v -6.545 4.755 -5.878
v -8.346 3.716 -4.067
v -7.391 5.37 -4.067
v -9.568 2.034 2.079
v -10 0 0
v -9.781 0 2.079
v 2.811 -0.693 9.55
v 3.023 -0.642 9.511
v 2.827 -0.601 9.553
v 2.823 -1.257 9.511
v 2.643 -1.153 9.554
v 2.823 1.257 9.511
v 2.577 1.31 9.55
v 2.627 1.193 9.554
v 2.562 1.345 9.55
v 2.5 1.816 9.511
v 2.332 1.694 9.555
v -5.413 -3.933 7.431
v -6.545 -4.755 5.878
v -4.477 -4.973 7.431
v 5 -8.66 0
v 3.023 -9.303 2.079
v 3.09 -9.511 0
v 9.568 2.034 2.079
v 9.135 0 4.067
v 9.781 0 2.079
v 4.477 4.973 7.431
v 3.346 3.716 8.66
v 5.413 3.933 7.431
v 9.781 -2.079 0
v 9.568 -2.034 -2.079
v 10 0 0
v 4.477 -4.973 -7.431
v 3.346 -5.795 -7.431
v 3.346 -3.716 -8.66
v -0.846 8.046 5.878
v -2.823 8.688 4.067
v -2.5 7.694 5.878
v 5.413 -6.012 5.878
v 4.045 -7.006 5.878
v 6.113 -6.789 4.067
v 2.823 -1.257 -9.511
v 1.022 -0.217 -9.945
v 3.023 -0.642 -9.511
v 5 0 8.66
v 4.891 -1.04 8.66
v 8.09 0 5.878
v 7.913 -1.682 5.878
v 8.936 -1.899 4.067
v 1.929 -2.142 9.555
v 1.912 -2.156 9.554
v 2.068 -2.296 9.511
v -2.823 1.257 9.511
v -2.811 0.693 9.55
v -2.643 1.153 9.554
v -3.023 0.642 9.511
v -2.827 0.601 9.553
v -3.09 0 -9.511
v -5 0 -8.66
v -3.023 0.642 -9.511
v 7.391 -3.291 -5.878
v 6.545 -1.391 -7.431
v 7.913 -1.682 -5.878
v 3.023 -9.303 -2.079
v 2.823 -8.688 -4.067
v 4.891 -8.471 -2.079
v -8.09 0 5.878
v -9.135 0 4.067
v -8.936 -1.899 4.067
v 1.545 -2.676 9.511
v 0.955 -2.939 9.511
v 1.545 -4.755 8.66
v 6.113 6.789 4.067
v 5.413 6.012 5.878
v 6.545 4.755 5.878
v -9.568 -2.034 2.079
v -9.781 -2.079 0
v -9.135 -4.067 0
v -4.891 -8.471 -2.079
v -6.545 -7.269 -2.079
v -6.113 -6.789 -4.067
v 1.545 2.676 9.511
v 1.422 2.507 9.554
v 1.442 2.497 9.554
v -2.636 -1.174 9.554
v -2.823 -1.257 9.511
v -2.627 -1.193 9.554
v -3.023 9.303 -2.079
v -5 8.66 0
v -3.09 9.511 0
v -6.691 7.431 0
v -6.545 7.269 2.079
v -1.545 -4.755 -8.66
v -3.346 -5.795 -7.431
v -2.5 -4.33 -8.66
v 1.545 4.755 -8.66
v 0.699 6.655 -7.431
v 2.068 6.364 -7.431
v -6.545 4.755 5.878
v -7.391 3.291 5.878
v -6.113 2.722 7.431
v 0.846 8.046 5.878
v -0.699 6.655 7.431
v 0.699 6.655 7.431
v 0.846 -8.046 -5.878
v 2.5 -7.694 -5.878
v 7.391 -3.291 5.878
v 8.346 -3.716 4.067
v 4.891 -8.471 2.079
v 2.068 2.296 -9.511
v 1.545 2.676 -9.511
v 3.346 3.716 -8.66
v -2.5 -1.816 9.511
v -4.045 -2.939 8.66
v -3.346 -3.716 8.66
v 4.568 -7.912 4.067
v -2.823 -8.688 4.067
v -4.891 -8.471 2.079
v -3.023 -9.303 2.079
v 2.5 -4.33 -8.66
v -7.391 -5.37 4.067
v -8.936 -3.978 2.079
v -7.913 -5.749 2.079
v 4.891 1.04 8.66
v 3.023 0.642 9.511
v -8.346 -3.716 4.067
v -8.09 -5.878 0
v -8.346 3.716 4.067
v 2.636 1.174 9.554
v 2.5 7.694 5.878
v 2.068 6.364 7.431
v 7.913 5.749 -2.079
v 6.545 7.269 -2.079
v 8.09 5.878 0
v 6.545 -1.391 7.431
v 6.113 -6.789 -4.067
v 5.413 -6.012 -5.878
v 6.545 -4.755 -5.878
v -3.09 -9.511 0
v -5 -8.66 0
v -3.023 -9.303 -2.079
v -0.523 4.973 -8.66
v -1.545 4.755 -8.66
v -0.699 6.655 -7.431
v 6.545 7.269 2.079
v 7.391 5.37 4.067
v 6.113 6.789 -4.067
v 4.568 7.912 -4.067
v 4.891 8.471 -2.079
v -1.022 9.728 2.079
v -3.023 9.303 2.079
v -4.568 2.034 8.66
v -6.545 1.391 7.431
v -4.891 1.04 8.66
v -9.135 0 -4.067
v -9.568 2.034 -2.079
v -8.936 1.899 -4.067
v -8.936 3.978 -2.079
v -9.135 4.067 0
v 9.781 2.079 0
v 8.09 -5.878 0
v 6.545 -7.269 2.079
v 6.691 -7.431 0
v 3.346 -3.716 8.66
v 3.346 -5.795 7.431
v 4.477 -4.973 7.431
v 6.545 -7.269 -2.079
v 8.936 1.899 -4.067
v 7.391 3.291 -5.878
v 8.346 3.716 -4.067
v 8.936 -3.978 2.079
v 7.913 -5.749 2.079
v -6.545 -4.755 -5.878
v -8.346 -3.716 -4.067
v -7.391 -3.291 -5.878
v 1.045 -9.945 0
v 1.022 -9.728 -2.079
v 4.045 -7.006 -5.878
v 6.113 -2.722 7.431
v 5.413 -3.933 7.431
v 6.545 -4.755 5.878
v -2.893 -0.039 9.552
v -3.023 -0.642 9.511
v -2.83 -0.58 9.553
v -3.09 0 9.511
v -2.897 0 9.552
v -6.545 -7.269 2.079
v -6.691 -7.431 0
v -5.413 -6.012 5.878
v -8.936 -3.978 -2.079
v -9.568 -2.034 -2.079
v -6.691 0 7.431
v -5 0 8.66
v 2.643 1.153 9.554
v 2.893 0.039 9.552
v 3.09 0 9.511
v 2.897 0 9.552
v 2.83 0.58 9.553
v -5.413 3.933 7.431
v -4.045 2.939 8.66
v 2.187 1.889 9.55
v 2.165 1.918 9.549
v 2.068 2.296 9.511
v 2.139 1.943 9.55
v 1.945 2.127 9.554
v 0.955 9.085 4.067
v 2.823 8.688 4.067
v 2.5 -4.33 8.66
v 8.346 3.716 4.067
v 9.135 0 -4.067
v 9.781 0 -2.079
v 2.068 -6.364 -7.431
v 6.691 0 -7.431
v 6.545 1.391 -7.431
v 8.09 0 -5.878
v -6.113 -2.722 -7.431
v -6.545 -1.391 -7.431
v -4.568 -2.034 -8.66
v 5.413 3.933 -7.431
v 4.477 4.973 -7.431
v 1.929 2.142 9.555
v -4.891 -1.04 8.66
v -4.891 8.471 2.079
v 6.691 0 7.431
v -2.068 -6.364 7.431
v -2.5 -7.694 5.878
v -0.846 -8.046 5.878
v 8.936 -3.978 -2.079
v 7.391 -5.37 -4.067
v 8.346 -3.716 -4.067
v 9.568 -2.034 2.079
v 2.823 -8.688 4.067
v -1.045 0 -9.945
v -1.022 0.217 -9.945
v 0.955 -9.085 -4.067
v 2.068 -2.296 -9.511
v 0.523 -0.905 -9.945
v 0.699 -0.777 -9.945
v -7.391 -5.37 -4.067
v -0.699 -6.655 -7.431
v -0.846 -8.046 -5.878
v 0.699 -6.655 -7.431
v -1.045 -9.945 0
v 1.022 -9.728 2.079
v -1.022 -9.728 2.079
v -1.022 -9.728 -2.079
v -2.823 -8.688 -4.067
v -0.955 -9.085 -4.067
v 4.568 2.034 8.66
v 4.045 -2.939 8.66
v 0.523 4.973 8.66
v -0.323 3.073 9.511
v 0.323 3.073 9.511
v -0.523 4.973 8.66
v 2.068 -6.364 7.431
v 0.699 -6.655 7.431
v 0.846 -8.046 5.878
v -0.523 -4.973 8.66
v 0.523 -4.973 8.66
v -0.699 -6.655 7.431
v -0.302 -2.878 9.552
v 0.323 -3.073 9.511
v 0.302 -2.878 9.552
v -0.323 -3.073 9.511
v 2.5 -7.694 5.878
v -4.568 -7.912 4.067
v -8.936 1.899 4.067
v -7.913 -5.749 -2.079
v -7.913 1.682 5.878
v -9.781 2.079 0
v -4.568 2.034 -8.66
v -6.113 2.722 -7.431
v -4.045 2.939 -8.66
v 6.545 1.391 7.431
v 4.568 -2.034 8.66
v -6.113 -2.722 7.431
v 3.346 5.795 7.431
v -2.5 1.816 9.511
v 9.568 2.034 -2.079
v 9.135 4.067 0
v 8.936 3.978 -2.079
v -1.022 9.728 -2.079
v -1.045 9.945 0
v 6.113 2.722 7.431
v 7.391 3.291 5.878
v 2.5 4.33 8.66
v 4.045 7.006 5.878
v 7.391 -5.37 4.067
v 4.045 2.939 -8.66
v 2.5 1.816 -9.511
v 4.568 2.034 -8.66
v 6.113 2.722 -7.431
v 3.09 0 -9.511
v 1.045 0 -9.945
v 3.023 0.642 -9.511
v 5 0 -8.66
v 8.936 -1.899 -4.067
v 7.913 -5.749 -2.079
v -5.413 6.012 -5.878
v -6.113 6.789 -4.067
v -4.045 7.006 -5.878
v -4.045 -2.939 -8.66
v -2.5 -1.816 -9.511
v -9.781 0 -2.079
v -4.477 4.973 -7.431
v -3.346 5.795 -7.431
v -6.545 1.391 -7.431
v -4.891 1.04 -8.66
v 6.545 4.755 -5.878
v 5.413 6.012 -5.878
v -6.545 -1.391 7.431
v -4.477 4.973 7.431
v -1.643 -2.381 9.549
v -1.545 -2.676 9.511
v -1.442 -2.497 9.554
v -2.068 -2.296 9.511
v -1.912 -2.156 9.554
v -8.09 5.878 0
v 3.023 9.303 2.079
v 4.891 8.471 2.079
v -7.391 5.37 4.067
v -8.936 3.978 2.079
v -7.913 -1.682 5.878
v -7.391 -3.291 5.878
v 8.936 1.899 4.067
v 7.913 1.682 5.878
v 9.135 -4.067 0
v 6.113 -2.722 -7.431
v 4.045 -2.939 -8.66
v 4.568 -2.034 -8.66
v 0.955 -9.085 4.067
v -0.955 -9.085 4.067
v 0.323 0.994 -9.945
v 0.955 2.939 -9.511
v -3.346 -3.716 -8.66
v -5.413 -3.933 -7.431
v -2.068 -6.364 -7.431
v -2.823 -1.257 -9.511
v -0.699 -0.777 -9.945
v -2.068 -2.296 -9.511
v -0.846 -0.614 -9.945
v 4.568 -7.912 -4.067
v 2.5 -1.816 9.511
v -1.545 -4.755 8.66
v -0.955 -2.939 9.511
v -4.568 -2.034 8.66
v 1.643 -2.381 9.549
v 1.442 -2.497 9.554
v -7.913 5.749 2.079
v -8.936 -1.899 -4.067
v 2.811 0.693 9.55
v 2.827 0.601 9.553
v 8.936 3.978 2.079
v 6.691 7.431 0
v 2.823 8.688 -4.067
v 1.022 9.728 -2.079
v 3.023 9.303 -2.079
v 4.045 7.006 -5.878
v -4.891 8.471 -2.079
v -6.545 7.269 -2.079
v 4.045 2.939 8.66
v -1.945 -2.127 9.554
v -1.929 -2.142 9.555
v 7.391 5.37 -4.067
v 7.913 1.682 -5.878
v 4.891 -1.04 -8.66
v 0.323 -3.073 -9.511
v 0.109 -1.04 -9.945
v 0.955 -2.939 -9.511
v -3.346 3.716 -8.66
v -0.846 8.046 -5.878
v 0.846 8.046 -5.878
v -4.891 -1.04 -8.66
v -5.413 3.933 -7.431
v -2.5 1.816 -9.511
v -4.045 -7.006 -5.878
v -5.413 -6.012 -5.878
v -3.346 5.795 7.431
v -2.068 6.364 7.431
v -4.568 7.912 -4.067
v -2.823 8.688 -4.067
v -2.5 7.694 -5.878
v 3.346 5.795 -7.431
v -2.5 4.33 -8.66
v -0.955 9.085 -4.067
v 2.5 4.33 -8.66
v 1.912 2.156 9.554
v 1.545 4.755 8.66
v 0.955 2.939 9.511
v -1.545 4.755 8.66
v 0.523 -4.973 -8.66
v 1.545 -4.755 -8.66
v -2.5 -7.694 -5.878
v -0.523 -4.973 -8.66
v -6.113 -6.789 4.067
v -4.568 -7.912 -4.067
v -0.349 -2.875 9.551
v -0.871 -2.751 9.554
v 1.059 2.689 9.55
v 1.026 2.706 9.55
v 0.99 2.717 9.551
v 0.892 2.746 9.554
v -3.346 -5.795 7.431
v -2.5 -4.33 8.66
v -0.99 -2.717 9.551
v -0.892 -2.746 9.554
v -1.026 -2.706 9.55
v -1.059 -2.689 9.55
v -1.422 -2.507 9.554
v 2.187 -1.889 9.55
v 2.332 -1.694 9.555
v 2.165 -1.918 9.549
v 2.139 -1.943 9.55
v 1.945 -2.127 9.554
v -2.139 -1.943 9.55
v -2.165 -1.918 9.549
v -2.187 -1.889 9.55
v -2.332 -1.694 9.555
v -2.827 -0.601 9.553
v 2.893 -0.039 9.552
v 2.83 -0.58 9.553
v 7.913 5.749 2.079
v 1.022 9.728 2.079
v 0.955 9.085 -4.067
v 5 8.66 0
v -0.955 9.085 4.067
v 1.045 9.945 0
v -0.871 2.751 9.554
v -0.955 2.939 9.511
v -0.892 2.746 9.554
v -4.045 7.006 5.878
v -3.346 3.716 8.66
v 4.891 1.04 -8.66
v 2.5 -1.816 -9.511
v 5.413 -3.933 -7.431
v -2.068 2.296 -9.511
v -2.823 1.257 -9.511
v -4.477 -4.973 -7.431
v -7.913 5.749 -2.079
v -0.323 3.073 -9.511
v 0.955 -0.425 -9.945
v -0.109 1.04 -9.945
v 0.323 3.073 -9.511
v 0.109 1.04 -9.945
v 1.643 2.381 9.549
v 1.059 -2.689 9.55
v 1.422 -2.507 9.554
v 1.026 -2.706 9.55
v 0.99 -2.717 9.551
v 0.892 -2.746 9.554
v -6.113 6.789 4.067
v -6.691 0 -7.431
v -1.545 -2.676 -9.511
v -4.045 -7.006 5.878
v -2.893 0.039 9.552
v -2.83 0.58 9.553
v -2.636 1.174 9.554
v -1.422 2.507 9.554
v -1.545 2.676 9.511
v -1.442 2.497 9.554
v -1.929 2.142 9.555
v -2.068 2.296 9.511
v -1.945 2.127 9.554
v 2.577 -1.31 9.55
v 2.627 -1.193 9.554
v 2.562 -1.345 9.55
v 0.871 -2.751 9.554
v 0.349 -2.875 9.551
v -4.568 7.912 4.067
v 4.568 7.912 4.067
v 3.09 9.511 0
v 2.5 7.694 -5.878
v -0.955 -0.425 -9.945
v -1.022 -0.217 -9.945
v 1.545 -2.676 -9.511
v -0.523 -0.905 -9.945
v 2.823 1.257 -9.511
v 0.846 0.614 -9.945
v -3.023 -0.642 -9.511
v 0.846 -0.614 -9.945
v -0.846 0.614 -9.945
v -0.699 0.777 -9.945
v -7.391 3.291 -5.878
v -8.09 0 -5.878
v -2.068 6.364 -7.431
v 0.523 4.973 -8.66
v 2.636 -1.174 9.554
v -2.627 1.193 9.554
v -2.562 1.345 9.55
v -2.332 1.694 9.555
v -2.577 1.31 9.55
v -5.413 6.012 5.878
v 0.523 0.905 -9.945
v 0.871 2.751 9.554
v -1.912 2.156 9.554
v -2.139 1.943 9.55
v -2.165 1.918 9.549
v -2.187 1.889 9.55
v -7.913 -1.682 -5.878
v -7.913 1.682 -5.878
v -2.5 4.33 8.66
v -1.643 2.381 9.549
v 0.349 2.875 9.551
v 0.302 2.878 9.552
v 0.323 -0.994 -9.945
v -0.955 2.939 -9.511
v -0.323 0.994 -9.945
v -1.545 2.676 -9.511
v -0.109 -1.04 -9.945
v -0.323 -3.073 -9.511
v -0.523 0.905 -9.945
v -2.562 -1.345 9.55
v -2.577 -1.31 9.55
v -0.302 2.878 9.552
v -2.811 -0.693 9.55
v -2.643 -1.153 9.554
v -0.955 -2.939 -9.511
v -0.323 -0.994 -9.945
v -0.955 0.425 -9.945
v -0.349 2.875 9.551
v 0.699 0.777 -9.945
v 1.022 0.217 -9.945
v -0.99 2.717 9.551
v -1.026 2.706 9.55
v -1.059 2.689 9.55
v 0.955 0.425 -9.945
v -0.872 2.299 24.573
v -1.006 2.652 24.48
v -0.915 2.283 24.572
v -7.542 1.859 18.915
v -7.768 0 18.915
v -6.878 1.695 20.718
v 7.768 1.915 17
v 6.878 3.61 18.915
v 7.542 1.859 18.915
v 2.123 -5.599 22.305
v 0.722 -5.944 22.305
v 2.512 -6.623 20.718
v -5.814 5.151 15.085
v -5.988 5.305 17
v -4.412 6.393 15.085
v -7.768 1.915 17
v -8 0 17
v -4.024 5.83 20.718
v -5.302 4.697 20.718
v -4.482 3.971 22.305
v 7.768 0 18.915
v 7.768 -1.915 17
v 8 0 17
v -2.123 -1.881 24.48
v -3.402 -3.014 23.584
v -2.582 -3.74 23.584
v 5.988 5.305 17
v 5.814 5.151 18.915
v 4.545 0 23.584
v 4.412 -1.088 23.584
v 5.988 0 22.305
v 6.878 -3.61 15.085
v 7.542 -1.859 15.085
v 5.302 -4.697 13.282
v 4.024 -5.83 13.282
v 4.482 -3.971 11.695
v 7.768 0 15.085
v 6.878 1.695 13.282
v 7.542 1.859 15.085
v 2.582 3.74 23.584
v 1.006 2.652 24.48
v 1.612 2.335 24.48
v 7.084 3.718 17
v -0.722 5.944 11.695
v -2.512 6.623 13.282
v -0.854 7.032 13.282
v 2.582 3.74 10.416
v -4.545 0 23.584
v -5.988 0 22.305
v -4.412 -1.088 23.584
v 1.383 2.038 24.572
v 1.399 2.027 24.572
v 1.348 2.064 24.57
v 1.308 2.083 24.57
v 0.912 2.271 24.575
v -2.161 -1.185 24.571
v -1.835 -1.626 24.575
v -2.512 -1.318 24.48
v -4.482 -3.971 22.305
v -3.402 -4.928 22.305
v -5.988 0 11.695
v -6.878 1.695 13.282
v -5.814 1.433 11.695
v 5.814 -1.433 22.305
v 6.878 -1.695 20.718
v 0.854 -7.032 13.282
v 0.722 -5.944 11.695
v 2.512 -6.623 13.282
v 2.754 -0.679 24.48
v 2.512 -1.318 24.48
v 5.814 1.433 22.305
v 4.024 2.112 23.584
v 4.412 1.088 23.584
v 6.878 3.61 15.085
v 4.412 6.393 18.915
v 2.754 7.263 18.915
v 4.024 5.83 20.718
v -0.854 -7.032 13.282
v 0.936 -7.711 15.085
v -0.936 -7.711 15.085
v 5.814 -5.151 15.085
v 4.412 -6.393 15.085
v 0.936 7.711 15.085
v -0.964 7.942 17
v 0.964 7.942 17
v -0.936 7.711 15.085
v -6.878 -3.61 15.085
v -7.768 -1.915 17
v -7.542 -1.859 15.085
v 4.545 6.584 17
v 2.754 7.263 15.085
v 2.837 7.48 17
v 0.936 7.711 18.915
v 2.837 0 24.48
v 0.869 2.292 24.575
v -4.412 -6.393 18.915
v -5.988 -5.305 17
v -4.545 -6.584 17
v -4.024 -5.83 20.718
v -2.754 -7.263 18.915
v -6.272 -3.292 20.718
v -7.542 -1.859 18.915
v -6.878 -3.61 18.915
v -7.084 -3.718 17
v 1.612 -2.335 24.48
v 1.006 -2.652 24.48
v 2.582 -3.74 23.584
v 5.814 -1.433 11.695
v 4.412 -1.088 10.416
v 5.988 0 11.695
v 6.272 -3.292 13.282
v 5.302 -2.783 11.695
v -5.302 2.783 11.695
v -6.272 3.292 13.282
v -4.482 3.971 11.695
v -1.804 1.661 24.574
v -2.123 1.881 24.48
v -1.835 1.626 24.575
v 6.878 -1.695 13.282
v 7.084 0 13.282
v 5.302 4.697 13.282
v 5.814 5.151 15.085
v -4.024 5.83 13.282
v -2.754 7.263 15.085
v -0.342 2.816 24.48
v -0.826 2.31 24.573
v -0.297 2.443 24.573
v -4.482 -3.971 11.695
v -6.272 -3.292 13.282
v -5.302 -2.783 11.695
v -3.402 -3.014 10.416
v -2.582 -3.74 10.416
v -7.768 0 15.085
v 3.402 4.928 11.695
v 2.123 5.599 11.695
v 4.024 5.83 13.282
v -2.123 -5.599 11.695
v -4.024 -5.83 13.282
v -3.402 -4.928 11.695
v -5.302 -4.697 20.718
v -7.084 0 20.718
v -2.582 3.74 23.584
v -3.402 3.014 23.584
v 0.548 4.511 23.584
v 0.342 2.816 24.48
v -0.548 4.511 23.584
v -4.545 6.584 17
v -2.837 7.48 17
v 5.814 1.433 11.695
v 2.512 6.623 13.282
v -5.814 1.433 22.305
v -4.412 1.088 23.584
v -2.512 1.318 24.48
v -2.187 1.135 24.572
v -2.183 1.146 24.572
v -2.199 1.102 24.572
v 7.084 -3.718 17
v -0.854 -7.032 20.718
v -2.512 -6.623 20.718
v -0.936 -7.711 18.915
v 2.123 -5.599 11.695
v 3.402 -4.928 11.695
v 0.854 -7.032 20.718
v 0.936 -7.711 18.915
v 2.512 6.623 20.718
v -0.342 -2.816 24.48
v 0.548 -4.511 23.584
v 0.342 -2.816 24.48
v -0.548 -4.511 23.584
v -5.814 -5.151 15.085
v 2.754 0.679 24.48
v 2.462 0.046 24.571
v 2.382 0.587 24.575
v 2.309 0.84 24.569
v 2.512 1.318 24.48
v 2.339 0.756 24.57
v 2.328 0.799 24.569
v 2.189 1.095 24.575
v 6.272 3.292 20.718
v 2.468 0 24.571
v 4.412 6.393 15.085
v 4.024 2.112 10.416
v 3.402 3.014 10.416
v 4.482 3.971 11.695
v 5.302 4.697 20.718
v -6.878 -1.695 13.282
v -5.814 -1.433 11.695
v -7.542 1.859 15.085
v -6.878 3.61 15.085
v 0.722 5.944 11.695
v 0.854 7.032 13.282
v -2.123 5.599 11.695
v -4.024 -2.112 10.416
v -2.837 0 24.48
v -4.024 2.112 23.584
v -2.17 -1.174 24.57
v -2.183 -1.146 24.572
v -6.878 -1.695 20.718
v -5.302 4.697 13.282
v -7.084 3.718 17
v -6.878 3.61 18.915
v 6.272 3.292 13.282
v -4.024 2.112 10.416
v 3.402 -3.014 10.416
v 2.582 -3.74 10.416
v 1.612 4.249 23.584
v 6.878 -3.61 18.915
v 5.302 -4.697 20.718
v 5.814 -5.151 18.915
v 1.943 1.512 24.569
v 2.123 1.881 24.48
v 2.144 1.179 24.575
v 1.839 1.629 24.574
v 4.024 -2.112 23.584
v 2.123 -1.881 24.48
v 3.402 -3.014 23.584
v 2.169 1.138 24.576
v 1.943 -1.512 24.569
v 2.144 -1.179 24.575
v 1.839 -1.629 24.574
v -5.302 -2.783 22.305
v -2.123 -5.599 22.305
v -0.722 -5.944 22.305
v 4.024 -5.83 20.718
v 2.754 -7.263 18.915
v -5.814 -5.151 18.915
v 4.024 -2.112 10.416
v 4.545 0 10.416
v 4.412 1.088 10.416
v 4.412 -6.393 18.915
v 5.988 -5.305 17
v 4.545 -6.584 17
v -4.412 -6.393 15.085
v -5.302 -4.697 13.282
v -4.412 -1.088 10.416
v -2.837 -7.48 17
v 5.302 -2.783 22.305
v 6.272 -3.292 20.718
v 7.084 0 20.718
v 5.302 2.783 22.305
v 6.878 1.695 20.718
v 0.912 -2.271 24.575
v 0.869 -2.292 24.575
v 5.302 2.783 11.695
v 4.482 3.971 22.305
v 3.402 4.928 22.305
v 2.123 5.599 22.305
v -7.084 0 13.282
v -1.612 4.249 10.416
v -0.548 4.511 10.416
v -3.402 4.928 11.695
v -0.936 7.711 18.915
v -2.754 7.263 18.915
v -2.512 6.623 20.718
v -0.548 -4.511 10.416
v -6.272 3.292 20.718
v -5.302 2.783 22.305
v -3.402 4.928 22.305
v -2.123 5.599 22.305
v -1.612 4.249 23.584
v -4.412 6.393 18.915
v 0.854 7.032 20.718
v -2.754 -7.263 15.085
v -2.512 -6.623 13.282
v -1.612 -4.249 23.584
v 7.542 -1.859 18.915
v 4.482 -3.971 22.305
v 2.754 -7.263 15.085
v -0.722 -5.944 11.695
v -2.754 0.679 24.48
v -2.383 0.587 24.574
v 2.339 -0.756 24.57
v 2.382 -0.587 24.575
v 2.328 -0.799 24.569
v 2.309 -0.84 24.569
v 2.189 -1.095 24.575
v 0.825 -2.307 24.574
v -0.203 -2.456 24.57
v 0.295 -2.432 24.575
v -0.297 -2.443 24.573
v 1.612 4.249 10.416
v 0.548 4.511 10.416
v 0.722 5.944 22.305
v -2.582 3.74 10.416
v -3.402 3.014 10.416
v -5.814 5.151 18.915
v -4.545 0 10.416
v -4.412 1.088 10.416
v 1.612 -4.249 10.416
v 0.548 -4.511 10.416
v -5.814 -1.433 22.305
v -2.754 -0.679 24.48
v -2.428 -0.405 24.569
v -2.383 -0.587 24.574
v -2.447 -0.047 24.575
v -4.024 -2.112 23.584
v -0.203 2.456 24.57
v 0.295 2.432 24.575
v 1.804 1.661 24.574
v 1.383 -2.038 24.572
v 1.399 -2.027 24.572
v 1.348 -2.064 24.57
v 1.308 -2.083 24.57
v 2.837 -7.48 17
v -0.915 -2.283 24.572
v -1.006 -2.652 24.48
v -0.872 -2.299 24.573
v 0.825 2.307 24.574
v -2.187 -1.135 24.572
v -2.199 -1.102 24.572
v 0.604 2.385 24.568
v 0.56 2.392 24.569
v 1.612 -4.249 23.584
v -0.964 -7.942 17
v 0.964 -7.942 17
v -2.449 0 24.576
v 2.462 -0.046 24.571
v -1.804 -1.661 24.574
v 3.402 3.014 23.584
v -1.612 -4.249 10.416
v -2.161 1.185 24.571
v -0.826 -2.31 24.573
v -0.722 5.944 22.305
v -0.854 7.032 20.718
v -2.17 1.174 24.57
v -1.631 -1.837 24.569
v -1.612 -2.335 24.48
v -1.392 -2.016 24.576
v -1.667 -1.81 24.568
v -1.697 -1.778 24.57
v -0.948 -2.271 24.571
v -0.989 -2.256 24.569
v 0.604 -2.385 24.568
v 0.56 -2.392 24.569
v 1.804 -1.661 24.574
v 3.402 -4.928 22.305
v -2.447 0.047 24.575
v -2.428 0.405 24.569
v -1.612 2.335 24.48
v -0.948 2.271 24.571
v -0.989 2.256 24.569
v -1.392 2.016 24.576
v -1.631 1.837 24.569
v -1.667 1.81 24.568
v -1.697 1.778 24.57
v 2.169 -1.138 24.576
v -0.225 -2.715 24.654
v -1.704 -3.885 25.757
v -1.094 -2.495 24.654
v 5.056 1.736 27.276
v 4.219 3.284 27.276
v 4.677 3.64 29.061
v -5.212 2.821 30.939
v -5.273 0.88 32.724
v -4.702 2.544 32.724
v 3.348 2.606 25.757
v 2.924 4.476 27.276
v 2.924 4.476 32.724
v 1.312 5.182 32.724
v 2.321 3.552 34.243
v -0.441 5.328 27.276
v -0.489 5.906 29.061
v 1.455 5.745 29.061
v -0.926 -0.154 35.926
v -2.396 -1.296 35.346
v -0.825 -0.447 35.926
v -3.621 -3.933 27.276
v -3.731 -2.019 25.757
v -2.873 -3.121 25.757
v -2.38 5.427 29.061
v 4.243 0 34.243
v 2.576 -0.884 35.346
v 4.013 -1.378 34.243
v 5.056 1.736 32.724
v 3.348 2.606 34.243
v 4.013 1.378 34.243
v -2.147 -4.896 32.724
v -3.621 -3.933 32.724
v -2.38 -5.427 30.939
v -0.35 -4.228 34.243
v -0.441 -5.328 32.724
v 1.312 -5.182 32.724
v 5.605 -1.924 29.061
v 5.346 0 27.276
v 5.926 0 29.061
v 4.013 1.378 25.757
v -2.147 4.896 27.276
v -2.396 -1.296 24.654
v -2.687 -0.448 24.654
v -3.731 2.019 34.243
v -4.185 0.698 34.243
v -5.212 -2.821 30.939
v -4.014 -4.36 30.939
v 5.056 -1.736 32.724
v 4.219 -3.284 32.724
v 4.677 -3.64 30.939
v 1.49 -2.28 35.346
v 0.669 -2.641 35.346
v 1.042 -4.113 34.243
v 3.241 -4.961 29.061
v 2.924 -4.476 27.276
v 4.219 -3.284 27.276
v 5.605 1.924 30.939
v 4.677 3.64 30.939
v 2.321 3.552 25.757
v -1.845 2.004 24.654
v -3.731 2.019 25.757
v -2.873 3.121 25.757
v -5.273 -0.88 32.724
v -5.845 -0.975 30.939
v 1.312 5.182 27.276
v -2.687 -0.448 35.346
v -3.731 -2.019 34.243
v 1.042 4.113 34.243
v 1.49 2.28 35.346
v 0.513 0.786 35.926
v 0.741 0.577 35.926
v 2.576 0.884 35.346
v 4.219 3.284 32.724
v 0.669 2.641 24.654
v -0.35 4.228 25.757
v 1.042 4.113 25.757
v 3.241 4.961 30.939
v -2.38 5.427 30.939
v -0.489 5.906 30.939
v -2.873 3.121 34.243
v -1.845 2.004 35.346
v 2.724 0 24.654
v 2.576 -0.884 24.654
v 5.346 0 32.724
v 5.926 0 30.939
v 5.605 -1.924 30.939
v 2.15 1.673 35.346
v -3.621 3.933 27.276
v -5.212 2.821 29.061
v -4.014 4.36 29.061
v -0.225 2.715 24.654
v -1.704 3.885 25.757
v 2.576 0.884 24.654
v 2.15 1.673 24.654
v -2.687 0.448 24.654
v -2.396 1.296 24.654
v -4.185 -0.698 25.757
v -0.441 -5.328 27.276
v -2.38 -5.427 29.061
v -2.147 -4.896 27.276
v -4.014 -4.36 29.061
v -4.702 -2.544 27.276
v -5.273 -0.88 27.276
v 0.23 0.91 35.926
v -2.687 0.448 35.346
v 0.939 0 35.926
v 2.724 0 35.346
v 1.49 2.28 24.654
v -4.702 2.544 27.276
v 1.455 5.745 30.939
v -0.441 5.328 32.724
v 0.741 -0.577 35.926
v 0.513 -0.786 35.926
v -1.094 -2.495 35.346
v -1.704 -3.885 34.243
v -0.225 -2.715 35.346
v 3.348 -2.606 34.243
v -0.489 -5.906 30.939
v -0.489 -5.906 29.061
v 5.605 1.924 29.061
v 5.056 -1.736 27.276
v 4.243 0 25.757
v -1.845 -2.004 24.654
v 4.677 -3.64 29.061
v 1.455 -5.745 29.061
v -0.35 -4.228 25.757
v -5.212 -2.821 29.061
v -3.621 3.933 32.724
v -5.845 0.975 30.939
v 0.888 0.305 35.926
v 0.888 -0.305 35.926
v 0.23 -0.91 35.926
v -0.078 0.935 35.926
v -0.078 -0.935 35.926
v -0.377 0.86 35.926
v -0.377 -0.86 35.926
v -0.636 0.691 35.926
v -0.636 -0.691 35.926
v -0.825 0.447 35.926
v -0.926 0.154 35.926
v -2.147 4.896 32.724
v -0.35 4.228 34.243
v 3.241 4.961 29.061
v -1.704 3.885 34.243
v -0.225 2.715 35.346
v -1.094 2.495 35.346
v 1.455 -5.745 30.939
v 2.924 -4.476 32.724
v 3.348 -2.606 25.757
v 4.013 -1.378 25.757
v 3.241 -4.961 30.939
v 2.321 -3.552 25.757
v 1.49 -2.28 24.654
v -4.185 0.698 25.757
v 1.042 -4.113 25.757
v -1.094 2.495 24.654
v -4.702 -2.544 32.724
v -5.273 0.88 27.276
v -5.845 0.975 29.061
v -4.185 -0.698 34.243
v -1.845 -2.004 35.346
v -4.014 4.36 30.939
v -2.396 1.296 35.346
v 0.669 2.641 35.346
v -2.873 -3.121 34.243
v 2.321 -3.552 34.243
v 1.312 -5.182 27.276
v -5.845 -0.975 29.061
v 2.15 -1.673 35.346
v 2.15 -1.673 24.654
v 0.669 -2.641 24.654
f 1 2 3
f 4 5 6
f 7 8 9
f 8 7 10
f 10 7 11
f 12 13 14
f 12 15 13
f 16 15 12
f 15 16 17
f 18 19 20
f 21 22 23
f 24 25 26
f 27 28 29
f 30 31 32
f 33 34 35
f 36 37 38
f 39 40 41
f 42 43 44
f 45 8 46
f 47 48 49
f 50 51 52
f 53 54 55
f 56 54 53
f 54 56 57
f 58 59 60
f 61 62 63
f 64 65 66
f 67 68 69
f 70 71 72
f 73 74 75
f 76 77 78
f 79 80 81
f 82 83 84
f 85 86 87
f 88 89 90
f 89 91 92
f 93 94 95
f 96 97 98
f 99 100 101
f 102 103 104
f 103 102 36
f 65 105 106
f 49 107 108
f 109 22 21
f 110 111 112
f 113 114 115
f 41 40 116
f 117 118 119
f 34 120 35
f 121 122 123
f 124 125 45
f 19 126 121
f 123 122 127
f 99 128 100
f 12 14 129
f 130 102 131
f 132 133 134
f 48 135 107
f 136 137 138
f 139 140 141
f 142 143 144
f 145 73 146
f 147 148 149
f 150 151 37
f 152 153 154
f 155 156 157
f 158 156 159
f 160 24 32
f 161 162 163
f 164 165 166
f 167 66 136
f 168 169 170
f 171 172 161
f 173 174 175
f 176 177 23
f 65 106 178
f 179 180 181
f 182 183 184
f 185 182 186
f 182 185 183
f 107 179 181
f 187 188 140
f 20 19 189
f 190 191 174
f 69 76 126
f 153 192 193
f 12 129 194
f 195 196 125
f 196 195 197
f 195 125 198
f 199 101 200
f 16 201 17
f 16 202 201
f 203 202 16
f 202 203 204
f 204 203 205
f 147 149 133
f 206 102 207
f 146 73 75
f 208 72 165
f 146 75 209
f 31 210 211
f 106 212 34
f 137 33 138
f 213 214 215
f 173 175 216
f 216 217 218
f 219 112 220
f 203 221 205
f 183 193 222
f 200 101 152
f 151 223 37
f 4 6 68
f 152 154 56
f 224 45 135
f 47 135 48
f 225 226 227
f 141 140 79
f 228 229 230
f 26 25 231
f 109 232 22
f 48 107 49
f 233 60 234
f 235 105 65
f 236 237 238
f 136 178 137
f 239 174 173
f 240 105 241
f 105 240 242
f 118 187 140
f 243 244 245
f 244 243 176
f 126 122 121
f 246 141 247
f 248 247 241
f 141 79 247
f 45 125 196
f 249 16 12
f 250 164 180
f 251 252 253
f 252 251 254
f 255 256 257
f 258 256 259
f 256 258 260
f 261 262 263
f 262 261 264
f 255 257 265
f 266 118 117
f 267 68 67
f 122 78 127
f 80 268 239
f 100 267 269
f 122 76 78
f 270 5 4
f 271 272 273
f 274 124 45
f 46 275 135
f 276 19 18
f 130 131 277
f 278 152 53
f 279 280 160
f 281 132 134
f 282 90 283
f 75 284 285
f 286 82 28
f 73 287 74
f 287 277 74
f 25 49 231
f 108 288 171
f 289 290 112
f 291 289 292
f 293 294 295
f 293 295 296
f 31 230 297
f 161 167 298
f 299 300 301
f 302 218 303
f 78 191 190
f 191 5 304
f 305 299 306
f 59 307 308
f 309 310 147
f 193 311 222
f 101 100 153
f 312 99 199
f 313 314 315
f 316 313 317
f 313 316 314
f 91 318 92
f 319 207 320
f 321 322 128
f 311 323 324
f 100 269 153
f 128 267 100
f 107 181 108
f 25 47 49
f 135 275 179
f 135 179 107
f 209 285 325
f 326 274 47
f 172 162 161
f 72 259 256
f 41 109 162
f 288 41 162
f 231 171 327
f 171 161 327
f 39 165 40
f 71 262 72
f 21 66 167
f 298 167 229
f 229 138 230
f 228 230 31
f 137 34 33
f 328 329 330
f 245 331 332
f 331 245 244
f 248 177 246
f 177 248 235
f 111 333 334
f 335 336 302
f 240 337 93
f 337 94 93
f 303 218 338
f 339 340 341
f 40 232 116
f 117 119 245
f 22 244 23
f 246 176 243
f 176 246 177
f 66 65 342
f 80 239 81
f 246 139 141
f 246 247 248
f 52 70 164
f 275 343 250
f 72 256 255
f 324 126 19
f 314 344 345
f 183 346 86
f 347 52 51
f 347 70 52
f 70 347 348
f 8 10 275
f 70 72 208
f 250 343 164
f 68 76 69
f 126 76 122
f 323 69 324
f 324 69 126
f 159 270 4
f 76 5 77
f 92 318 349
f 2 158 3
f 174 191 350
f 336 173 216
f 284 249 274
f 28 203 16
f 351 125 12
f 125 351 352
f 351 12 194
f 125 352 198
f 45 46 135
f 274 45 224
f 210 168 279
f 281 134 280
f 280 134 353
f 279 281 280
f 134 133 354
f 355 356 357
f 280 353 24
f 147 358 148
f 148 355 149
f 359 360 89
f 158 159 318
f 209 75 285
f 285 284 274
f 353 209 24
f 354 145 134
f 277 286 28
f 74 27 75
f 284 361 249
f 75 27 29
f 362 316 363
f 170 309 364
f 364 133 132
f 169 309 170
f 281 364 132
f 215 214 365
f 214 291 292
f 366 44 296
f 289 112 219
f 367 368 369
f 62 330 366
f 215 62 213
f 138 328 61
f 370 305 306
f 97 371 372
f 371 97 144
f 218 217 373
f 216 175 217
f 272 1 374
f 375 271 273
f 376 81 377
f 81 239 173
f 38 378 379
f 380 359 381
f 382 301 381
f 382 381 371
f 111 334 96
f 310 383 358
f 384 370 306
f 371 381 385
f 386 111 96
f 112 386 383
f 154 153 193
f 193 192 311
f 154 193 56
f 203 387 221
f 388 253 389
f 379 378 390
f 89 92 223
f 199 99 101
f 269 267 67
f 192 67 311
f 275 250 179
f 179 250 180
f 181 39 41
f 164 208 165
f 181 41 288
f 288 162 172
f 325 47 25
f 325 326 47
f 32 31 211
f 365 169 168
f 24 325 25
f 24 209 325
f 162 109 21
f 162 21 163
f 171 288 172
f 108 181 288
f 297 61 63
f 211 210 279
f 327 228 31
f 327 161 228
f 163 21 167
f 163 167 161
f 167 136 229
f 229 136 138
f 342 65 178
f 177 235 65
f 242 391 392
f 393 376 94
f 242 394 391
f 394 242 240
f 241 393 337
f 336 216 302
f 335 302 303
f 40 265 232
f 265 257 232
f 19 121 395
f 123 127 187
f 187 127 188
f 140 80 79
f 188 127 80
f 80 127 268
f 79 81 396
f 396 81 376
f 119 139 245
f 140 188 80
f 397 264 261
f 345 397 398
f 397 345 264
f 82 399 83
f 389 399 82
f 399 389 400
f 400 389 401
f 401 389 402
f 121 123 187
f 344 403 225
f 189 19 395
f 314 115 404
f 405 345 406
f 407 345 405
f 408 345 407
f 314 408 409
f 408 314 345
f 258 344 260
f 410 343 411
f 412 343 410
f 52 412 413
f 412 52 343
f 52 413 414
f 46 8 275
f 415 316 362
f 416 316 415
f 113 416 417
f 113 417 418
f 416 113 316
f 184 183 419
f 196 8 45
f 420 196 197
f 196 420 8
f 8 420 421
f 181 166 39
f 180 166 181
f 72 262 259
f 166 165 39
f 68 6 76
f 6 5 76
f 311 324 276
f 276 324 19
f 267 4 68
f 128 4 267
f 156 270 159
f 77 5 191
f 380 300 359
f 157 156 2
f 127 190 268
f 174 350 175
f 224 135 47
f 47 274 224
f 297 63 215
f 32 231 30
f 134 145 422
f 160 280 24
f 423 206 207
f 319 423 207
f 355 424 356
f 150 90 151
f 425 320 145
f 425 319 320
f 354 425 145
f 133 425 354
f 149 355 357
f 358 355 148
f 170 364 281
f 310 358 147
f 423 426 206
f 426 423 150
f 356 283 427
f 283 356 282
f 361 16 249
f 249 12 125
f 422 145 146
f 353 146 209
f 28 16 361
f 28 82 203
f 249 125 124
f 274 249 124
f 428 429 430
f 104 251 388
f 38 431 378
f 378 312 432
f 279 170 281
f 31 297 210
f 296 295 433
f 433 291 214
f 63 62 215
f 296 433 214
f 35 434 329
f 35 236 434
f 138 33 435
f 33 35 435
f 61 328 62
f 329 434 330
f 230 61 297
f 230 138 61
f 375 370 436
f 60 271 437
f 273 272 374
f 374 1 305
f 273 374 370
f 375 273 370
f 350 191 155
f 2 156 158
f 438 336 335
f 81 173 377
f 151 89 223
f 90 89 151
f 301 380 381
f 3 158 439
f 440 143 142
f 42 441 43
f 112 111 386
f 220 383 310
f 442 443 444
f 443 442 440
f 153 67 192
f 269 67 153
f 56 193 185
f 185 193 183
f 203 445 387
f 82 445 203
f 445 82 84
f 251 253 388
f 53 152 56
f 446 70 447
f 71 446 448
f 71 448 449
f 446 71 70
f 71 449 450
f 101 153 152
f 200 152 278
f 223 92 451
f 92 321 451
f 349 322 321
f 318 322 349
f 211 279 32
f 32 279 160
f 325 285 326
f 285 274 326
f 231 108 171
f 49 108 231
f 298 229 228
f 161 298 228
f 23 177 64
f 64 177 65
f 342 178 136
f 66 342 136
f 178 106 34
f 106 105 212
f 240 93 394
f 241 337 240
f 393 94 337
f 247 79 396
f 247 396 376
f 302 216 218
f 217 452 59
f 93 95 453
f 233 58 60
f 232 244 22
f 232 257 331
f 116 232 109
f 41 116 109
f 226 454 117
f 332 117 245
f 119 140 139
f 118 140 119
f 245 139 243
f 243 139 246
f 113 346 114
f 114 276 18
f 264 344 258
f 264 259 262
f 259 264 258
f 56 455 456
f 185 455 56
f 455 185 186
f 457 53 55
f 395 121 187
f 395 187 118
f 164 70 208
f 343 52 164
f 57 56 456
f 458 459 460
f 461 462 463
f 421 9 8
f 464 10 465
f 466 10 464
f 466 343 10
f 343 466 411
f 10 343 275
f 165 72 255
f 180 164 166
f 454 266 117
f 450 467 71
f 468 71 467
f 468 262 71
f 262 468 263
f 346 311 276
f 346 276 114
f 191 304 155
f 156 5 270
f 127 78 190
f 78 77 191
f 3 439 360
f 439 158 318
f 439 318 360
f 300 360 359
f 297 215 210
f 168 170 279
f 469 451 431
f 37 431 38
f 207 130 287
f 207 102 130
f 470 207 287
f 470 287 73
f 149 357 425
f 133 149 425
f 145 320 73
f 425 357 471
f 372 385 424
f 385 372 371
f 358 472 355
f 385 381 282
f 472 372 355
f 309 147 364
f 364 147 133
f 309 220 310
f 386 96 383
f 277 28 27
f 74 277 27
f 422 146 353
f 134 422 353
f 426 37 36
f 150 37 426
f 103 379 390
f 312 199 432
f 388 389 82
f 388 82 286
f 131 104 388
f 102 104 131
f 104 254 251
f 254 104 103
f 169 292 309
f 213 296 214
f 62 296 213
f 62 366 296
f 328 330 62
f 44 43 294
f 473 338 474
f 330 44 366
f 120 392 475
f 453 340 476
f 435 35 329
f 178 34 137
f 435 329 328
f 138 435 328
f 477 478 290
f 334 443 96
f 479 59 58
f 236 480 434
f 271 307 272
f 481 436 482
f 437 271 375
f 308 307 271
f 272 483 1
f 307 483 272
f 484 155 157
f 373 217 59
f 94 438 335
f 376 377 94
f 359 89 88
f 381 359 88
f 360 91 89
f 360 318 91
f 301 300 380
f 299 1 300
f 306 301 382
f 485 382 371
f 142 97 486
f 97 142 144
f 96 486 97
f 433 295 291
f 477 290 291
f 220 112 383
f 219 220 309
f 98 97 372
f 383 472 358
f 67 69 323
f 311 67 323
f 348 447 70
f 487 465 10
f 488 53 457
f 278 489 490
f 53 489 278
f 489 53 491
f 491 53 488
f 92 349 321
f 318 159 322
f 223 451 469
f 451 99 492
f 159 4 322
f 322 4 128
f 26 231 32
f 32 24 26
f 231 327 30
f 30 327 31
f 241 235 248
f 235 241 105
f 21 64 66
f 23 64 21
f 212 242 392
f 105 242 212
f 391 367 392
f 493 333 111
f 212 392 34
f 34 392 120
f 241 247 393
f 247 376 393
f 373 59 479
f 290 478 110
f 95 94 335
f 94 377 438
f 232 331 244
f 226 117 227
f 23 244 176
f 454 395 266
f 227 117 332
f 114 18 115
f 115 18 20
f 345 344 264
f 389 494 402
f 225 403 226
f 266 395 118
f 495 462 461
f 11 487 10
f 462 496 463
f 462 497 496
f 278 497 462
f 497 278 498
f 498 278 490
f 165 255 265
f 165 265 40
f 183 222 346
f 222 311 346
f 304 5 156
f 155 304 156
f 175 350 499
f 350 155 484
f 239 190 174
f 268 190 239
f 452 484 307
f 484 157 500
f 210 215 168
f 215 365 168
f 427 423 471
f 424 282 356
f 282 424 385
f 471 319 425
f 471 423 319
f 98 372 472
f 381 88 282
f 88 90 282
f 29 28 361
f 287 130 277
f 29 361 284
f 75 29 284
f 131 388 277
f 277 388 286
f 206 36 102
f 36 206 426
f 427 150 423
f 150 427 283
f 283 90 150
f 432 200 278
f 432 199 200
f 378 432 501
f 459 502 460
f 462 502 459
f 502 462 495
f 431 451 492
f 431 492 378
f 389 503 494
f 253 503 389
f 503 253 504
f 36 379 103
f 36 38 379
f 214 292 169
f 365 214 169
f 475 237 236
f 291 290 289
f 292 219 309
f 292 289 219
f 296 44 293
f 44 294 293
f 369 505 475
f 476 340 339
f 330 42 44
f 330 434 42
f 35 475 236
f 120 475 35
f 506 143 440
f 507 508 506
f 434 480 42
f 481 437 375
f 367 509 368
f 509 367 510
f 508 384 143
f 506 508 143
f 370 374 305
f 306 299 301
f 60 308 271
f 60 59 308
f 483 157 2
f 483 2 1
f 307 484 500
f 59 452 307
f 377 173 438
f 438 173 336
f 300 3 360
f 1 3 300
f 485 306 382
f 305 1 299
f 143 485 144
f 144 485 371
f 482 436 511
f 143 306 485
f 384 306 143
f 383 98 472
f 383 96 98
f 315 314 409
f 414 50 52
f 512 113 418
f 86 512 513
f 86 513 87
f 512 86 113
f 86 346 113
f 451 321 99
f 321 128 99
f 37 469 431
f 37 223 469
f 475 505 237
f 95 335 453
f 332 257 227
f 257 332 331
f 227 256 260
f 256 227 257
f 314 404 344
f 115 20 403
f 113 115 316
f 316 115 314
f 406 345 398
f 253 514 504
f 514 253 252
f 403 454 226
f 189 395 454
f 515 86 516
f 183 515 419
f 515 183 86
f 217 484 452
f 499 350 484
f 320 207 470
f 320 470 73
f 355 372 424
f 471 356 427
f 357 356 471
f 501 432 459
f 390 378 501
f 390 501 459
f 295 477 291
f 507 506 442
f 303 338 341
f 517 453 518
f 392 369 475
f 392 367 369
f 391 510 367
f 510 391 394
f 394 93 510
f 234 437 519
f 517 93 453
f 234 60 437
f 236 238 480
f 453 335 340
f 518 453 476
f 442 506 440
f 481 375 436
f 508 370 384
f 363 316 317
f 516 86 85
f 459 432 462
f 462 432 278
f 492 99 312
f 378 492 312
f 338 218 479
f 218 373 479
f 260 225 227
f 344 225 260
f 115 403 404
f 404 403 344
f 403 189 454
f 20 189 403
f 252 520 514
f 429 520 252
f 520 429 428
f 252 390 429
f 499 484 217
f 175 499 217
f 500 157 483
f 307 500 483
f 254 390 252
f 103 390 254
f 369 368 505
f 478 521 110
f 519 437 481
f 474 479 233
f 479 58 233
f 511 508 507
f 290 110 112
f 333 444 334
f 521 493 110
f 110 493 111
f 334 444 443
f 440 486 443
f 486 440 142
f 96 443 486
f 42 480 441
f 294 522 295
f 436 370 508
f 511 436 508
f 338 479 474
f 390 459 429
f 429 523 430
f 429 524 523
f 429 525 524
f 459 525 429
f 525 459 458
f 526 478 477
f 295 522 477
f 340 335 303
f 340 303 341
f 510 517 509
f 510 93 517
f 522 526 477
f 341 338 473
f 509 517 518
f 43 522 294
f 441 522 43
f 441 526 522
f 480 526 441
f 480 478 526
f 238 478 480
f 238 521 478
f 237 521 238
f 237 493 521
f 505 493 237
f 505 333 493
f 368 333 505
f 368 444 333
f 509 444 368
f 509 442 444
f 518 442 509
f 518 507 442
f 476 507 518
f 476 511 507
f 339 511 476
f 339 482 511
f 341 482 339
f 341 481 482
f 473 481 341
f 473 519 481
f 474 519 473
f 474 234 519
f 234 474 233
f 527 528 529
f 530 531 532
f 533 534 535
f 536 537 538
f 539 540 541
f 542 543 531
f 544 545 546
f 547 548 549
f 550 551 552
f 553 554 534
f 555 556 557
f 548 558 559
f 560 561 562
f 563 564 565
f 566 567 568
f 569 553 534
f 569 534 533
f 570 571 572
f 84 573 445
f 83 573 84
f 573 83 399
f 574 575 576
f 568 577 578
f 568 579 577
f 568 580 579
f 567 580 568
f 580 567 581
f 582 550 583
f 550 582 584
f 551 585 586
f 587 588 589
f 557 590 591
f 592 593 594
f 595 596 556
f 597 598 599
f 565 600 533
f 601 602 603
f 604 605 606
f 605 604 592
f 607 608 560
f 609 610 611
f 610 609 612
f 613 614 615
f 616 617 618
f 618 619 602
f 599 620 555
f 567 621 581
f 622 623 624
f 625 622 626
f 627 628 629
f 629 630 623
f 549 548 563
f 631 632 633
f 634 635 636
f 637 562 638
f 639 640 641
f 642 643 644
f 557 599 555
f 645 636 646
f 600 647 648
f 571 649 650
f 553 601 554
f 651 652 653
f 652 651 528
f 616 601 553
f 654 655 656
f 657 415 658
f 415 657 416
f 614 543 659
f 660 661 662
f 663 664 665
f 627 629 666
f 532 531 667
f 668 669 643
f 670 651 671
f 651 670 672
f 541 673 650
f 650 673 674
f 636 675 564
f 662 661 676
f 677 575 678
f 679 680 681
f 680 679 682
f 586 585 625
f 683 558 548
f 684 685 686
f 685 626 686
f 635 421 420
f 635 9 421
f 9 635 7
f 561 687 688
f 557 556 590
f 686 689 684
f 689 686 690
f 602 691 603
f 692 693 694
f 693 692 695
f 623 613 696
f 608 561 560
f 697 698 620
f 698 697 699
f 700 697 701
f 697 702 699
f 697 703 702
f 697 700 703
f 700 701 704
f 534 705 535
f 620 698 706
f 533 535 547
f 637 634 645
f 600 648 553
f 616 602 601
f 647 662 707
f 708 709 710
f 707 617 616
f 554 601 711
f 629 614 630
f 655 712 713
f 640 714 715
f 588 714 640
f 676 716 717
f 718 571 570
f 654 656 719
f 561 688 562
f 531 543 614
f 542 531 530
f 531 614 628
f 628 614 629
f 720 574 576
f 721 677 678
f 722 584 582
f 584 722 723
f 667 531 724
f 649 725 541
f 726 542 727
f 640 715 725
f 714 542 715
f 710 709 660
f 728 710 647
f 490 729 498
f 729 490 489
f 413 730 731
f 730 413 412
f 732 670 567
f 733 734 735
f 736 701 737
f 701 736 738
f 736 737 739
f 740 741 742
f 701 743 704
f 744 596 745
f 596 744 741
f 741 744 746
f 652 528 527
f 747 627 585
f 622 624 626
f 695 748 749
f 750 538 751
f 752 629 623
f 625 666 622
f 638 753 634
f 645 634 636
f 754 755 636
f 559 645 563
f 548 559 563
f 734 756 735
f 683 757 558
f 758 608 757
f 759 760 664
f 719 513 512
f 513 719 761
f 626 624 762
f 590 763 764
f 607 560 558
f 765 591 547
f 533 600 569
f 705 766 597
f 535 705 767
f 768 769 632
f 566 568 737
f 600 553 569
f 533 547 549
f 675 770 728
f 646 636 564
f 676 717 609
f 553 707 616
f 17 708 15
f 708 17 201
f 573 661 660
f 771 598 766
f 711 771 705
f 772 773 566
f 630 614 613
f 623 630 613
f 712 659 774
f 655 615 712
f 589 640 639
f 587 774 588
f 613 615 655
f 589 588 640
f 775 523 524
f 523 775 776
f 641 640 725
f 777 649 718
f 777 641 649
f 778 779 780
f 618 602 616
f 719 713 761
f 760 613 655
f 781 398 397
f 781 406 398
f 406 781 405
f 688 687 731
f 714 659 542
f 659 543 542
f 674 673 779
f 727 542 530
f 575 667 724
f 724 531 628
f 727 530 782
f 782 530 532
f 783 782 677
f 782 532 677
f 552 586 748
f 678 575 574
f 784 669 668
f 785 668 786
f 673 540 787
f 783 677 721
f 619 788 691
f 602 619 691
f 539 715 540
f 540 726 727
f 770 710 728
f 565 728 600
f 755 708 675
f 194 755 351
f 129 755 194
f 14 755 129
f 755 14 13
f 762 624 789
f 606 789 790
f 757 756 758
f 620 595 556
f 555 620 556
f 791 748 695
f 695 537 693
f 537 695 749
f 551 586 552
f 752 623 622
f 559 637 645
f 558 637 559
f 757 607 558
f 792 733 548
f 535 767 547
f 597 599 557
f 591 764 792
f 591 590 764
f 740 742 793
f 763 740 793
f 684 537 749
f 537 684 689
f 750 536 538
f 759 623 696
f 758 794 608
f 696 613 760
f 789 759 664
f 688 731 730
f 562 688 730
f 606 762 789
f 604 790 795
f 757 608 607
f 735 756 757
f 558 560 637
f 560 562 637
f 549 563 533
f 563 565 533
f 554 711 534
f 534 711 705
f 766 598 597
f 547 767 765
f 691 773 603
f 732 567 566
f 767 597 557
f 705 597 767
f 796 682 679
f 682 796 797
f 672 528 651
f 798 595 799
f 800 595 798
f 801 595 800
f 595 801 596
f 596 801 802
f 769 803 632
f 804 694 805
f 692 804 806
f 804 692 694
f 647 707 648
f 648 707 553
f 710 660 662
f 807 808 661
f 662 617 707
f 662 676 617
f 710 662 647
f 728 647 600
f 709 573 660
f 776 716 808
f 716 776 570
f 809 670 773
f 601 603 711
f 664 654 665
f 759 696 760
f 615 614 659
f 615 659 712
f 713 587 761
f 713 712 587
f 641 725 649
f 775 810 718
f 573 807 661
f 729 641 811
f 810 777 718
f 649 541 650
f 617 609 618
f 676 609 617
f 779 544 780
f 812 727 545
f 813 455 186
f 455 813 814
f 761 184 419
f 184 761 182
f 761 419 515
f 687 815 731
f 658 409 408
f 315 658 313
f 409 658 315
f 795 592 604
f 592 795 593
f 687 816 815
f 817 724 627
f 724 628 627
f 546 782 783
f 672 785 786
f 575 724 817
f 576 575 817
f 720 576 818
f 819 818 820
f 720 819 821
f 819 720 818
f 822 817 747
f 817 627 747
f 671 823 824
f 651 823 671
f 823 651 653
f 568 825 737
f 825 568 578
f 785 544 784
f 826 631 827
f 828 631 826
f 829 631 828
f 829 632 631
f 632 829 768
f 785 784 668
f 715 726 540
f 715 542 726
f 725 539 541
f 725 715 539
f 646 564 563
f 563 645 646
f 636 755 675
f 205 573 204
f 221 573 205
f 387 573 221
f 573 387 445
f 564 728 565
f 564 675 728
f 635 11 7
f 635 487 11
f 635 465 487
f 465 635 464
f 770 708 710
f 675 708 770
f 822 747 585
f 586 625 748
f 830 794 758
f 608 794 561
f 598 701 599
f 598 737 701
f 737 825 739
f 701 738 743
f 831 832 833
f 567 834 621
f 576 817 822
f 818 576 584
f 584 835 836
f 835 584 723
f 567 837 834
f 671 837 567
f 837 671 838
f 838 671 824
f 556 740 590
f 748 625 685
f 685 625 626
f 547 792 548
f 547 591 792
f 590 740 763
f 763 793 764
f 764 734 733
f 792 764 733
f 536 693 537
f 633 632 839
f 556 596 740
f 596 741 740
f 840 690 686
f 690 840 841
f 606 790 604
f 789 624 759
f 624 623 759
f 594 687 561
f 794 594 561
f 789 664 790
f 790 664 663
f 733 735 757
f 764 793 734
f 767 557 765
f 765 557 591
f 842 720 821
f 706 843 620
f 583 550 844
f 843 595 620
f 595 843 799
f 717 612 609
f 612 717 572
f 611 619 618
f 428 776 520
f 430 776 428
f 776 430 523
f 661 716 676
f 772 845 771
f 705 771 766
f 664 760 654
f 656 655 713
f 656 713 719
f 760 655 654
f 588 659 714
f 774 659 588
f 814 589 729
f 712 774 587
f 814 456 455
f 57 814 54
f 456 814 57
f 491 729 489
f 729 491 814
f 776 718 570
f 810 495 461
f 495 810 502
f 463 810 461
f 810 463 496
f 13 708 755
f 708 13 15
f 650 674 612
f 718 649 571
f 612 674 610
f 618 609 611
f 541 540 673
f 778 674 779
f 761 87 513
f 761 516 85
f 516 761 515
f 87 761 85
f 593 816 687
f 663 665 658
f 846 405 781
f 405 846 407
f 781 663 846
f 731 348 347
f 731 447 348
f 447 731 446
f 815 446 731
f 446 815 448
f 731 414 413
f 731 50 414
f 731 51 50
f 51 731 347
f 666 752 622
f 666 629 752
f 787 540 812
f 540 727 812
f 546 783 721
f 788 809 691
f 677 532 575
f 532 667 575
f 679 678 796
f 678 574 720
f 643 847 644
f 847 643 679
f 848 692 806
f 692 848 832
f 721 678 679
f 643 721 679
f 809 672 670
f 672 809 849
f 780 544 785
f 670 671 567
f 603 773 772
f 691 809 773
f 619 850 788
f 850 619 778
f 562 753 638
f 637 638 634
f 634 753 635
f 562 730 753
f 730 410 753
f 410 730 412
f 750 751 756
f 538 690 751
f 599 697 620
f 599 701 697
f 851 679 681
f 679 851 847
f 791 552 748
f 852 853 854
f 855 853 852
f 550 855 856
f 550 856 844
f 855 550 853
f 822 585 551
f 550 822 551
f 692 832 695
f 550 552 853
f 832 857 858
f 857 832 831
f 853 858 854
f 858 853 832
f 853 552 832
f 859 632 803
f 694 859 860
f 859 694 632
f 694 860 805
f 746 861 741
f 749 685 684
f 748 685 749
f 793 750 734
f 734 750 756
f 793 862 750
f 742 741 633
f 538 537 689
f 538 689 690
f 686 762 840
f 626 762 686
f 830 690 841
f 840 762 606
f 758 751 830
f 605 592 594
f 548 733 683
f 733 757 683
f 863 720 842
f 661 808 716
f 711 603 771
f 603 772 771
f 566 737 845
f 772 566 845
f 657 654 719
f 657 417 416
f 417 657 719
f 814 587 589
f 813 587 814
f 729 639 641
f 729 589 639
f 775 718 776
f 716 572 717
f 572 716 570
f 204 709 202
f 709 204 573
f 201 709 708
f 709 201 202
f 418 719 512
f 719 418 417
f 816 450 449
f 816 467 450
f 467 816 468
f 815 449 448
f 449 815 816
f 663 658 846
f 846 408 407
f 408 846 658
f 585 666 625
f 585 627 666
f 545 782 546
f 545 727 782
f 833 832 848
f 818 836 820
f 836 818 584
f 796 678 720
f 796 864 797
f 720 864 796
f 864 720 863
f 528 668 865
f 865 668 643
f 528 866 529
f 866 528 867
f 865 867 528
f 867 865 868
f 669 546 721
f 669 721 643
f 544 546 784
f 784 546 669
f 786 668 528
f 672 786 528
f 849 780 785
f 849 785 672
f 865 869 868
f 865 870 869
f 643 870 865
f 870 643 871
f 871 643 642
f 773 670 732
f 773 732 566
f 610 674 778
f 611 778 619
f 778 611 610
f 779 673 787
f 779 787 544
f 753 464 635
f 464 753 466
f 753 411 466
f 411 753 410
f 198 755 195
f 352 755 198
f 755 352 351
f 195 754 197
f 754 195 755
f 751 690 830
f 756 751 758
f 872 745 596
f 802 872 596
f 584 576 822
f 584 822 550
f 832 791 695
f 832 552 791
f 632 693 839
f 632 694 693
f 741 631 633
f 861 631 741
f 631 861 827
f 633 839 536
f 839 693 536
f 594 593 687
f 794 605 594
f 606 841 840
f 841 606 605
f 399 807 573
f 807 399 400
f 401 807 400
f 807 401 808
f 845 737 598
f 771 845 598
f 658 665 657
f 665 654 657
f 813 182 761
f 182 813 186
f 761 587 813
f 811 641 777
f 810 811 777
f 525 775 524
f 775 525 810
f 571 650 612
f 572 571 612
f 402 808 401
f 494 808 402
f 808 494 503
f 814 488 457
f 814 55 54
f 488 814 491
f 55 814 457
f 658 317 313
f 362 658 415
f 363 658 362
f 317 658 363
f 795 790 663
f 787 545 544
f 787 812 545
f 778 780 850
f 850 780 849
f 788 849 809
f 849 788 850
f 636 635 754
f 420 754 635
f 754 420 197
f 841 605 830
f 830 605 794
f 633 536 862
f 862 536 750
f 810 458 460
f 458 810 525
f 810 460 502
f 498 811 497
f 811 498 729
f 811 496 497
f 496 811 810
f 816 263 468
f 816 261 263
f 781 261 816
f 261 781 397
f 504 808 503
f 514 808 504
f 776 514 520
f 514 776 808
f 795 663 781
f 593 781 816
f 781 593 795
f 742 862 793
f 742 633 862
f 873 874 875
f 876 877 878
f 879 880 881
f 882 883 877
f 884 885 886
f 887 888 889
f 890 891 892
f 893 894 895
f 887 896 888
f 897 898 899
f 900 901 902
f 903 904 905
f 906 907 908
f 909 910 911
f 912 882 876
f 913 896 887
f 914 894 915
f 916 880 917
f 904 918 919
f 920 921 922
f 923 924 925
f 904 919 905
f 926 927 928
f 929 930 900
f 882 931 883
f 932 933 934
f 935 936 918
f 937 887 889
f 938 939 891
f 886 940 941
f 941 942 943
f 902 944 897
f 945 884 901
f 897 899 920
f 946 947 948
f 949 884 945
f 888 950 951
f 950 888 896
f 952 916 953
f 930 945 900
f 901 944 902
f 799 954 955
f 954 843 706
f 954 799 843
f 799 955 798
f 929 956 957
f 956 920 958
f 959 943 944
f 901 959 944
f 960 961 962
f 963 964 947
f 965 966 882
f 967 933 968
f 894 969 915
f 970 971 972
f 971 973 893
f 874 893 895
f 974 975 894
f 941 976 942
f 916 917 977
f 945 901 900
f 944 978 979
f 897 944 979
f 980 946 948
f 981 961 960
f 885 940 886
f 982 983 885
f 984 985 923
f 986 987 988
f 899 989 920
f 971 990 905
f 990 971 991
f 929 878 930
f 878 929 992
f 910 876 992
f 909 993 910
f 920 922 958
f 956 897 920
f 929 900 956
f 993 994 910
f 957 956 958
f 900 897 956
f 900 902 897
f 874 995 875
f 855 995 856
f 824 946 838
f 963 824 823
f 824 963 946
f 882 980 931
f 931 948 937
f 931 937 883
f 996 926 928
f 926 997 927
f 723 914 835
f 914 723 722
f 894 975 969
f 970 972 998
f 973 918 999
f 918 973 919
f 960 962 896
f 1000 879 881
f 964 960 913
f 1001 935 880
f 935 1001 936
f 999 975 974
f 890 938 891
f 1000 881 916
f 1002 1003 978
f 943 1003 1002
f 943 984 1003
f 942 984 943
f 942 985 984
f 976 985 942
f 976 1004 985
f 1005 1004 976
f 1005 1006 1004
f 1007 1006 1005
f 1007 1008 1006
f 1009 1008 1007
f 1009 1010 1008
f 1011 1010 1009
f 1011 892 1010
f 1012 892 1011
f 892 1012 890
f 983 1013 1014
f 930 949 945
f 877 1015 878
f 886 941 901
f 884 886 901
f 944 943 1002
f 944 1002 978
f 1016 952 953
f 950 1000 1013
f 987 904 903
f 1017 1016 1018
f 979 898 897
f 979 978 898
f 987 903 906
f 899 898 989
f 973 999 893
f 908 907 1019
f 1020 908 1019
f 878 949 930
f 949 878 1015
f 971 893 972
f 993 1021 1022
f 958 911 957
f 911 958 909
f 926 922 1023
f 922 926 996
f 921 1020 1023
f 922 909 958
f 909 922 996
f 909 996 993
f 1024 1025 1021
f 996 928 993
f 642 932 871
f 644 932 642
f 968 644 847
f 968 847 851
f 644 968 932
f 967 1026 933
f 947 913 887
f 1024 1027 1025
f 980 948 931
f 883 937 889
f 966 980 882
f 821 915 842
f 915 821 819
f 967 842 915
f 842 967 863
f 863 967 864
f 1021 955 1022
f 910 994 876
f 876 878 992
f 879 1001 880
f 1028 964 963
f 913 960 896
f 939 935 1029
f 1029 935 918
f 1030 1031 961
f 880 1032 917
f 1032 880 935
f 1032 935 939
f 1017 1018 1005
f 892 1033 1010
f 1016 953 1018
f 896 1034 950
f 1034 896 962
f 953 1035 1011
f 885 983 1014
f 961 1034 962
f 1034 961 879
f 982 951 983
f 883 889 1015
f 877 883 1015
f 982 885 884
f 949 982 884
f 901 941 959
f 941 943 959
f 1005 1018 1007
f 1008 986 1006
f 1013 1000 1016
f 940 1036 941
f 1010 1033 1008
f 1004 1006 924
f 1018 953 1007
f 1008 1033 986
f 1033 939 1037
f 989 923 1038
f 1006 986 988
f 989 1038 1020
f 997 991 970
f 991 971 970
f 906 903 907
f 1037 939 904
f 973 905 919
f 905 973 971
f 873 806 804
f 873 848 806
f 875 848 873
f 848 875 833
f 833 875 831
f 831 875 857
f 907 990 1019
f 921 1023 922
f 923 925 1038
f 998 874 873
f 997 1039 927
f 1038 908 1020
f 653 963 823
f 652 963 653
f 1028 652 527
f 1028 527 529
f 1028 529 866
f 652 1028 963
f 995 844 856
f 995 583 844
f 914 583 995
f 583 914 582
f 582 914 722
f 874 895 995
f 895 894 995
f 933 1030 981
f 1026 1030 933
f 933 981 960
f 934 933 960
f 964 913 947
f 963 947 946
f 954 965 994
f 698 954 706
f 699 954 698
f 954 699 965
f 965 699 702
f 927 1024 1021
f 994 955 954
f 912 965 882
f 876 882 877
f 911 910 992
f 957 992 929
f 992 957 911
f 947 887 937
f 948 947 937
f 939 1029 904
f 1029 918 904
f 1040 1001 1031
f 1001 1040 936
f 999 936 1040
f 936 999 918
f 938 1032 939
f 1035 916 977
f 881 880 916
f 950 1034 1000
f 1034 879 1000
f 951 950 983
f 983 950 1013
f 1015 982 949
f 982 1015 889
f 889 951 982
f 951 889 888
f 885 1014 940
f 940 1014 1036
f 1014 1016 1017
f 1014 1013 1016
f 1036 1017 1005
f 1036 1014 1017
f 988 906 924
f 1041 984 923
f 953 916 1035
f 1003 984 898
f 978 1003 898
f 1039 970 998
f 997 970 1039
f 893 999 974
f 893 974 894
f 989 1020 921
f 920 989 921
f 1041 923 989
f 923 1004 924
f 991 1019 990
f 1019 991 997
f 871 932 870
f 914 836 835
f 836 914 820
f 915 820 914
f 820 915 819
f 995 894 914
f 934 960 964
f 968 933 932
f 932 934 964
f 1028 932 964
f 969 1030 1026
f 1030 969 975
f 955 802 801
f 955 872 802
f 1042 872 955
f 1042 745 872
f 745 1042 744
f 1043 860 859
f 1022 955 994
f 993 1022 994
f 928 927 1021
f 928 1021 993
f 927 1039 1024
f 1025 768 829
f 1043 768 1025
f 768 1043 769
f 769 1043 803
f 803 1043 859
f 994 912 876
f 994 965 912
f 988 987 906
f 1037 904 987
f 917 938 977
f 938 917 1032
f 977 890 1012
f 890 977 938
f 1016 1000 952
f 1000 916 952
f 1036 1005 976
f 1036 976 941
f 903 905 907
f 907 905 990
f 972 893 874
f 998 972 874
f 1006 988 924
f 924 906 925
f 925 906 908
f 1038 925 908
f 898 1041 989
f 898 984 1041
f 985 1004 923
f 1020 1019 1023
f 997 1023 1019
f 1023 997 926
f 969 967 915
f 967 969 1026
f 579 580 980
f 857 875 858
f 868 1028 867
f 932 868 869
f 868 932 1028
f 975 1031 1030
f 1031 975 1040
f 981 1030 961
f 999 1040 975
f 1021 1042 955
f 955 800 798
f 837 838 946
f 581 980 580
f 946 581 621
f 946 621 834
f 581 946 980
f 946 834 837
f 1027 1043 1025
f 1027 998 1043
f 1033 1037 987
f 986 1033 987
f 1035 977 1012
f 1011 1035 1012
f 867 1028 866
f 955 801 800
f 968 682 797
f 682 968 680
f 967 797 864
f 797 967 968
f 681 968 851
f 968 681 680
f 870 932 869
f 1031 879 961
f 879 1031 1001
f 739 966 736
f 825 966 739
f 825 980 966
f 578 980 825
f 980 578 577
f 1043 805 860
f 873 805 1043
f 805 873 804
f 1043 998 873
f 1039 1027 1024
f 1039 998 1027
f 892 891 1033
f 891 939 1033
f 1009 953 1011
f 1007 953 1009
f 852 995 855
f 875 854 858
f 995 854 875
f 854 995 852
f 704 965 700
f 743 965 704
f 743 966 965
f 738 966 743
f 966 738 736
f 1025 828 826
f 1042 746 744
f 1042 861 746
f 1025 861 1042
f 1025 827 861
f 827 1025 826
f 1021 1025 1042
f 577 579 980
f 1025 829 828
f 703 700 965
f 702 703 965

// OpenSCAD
union() {
  sphere(r=10);
  translate([0,0,17]) sphere(r=8);
  translate([0,0,30]) sphere(r=6);
}
